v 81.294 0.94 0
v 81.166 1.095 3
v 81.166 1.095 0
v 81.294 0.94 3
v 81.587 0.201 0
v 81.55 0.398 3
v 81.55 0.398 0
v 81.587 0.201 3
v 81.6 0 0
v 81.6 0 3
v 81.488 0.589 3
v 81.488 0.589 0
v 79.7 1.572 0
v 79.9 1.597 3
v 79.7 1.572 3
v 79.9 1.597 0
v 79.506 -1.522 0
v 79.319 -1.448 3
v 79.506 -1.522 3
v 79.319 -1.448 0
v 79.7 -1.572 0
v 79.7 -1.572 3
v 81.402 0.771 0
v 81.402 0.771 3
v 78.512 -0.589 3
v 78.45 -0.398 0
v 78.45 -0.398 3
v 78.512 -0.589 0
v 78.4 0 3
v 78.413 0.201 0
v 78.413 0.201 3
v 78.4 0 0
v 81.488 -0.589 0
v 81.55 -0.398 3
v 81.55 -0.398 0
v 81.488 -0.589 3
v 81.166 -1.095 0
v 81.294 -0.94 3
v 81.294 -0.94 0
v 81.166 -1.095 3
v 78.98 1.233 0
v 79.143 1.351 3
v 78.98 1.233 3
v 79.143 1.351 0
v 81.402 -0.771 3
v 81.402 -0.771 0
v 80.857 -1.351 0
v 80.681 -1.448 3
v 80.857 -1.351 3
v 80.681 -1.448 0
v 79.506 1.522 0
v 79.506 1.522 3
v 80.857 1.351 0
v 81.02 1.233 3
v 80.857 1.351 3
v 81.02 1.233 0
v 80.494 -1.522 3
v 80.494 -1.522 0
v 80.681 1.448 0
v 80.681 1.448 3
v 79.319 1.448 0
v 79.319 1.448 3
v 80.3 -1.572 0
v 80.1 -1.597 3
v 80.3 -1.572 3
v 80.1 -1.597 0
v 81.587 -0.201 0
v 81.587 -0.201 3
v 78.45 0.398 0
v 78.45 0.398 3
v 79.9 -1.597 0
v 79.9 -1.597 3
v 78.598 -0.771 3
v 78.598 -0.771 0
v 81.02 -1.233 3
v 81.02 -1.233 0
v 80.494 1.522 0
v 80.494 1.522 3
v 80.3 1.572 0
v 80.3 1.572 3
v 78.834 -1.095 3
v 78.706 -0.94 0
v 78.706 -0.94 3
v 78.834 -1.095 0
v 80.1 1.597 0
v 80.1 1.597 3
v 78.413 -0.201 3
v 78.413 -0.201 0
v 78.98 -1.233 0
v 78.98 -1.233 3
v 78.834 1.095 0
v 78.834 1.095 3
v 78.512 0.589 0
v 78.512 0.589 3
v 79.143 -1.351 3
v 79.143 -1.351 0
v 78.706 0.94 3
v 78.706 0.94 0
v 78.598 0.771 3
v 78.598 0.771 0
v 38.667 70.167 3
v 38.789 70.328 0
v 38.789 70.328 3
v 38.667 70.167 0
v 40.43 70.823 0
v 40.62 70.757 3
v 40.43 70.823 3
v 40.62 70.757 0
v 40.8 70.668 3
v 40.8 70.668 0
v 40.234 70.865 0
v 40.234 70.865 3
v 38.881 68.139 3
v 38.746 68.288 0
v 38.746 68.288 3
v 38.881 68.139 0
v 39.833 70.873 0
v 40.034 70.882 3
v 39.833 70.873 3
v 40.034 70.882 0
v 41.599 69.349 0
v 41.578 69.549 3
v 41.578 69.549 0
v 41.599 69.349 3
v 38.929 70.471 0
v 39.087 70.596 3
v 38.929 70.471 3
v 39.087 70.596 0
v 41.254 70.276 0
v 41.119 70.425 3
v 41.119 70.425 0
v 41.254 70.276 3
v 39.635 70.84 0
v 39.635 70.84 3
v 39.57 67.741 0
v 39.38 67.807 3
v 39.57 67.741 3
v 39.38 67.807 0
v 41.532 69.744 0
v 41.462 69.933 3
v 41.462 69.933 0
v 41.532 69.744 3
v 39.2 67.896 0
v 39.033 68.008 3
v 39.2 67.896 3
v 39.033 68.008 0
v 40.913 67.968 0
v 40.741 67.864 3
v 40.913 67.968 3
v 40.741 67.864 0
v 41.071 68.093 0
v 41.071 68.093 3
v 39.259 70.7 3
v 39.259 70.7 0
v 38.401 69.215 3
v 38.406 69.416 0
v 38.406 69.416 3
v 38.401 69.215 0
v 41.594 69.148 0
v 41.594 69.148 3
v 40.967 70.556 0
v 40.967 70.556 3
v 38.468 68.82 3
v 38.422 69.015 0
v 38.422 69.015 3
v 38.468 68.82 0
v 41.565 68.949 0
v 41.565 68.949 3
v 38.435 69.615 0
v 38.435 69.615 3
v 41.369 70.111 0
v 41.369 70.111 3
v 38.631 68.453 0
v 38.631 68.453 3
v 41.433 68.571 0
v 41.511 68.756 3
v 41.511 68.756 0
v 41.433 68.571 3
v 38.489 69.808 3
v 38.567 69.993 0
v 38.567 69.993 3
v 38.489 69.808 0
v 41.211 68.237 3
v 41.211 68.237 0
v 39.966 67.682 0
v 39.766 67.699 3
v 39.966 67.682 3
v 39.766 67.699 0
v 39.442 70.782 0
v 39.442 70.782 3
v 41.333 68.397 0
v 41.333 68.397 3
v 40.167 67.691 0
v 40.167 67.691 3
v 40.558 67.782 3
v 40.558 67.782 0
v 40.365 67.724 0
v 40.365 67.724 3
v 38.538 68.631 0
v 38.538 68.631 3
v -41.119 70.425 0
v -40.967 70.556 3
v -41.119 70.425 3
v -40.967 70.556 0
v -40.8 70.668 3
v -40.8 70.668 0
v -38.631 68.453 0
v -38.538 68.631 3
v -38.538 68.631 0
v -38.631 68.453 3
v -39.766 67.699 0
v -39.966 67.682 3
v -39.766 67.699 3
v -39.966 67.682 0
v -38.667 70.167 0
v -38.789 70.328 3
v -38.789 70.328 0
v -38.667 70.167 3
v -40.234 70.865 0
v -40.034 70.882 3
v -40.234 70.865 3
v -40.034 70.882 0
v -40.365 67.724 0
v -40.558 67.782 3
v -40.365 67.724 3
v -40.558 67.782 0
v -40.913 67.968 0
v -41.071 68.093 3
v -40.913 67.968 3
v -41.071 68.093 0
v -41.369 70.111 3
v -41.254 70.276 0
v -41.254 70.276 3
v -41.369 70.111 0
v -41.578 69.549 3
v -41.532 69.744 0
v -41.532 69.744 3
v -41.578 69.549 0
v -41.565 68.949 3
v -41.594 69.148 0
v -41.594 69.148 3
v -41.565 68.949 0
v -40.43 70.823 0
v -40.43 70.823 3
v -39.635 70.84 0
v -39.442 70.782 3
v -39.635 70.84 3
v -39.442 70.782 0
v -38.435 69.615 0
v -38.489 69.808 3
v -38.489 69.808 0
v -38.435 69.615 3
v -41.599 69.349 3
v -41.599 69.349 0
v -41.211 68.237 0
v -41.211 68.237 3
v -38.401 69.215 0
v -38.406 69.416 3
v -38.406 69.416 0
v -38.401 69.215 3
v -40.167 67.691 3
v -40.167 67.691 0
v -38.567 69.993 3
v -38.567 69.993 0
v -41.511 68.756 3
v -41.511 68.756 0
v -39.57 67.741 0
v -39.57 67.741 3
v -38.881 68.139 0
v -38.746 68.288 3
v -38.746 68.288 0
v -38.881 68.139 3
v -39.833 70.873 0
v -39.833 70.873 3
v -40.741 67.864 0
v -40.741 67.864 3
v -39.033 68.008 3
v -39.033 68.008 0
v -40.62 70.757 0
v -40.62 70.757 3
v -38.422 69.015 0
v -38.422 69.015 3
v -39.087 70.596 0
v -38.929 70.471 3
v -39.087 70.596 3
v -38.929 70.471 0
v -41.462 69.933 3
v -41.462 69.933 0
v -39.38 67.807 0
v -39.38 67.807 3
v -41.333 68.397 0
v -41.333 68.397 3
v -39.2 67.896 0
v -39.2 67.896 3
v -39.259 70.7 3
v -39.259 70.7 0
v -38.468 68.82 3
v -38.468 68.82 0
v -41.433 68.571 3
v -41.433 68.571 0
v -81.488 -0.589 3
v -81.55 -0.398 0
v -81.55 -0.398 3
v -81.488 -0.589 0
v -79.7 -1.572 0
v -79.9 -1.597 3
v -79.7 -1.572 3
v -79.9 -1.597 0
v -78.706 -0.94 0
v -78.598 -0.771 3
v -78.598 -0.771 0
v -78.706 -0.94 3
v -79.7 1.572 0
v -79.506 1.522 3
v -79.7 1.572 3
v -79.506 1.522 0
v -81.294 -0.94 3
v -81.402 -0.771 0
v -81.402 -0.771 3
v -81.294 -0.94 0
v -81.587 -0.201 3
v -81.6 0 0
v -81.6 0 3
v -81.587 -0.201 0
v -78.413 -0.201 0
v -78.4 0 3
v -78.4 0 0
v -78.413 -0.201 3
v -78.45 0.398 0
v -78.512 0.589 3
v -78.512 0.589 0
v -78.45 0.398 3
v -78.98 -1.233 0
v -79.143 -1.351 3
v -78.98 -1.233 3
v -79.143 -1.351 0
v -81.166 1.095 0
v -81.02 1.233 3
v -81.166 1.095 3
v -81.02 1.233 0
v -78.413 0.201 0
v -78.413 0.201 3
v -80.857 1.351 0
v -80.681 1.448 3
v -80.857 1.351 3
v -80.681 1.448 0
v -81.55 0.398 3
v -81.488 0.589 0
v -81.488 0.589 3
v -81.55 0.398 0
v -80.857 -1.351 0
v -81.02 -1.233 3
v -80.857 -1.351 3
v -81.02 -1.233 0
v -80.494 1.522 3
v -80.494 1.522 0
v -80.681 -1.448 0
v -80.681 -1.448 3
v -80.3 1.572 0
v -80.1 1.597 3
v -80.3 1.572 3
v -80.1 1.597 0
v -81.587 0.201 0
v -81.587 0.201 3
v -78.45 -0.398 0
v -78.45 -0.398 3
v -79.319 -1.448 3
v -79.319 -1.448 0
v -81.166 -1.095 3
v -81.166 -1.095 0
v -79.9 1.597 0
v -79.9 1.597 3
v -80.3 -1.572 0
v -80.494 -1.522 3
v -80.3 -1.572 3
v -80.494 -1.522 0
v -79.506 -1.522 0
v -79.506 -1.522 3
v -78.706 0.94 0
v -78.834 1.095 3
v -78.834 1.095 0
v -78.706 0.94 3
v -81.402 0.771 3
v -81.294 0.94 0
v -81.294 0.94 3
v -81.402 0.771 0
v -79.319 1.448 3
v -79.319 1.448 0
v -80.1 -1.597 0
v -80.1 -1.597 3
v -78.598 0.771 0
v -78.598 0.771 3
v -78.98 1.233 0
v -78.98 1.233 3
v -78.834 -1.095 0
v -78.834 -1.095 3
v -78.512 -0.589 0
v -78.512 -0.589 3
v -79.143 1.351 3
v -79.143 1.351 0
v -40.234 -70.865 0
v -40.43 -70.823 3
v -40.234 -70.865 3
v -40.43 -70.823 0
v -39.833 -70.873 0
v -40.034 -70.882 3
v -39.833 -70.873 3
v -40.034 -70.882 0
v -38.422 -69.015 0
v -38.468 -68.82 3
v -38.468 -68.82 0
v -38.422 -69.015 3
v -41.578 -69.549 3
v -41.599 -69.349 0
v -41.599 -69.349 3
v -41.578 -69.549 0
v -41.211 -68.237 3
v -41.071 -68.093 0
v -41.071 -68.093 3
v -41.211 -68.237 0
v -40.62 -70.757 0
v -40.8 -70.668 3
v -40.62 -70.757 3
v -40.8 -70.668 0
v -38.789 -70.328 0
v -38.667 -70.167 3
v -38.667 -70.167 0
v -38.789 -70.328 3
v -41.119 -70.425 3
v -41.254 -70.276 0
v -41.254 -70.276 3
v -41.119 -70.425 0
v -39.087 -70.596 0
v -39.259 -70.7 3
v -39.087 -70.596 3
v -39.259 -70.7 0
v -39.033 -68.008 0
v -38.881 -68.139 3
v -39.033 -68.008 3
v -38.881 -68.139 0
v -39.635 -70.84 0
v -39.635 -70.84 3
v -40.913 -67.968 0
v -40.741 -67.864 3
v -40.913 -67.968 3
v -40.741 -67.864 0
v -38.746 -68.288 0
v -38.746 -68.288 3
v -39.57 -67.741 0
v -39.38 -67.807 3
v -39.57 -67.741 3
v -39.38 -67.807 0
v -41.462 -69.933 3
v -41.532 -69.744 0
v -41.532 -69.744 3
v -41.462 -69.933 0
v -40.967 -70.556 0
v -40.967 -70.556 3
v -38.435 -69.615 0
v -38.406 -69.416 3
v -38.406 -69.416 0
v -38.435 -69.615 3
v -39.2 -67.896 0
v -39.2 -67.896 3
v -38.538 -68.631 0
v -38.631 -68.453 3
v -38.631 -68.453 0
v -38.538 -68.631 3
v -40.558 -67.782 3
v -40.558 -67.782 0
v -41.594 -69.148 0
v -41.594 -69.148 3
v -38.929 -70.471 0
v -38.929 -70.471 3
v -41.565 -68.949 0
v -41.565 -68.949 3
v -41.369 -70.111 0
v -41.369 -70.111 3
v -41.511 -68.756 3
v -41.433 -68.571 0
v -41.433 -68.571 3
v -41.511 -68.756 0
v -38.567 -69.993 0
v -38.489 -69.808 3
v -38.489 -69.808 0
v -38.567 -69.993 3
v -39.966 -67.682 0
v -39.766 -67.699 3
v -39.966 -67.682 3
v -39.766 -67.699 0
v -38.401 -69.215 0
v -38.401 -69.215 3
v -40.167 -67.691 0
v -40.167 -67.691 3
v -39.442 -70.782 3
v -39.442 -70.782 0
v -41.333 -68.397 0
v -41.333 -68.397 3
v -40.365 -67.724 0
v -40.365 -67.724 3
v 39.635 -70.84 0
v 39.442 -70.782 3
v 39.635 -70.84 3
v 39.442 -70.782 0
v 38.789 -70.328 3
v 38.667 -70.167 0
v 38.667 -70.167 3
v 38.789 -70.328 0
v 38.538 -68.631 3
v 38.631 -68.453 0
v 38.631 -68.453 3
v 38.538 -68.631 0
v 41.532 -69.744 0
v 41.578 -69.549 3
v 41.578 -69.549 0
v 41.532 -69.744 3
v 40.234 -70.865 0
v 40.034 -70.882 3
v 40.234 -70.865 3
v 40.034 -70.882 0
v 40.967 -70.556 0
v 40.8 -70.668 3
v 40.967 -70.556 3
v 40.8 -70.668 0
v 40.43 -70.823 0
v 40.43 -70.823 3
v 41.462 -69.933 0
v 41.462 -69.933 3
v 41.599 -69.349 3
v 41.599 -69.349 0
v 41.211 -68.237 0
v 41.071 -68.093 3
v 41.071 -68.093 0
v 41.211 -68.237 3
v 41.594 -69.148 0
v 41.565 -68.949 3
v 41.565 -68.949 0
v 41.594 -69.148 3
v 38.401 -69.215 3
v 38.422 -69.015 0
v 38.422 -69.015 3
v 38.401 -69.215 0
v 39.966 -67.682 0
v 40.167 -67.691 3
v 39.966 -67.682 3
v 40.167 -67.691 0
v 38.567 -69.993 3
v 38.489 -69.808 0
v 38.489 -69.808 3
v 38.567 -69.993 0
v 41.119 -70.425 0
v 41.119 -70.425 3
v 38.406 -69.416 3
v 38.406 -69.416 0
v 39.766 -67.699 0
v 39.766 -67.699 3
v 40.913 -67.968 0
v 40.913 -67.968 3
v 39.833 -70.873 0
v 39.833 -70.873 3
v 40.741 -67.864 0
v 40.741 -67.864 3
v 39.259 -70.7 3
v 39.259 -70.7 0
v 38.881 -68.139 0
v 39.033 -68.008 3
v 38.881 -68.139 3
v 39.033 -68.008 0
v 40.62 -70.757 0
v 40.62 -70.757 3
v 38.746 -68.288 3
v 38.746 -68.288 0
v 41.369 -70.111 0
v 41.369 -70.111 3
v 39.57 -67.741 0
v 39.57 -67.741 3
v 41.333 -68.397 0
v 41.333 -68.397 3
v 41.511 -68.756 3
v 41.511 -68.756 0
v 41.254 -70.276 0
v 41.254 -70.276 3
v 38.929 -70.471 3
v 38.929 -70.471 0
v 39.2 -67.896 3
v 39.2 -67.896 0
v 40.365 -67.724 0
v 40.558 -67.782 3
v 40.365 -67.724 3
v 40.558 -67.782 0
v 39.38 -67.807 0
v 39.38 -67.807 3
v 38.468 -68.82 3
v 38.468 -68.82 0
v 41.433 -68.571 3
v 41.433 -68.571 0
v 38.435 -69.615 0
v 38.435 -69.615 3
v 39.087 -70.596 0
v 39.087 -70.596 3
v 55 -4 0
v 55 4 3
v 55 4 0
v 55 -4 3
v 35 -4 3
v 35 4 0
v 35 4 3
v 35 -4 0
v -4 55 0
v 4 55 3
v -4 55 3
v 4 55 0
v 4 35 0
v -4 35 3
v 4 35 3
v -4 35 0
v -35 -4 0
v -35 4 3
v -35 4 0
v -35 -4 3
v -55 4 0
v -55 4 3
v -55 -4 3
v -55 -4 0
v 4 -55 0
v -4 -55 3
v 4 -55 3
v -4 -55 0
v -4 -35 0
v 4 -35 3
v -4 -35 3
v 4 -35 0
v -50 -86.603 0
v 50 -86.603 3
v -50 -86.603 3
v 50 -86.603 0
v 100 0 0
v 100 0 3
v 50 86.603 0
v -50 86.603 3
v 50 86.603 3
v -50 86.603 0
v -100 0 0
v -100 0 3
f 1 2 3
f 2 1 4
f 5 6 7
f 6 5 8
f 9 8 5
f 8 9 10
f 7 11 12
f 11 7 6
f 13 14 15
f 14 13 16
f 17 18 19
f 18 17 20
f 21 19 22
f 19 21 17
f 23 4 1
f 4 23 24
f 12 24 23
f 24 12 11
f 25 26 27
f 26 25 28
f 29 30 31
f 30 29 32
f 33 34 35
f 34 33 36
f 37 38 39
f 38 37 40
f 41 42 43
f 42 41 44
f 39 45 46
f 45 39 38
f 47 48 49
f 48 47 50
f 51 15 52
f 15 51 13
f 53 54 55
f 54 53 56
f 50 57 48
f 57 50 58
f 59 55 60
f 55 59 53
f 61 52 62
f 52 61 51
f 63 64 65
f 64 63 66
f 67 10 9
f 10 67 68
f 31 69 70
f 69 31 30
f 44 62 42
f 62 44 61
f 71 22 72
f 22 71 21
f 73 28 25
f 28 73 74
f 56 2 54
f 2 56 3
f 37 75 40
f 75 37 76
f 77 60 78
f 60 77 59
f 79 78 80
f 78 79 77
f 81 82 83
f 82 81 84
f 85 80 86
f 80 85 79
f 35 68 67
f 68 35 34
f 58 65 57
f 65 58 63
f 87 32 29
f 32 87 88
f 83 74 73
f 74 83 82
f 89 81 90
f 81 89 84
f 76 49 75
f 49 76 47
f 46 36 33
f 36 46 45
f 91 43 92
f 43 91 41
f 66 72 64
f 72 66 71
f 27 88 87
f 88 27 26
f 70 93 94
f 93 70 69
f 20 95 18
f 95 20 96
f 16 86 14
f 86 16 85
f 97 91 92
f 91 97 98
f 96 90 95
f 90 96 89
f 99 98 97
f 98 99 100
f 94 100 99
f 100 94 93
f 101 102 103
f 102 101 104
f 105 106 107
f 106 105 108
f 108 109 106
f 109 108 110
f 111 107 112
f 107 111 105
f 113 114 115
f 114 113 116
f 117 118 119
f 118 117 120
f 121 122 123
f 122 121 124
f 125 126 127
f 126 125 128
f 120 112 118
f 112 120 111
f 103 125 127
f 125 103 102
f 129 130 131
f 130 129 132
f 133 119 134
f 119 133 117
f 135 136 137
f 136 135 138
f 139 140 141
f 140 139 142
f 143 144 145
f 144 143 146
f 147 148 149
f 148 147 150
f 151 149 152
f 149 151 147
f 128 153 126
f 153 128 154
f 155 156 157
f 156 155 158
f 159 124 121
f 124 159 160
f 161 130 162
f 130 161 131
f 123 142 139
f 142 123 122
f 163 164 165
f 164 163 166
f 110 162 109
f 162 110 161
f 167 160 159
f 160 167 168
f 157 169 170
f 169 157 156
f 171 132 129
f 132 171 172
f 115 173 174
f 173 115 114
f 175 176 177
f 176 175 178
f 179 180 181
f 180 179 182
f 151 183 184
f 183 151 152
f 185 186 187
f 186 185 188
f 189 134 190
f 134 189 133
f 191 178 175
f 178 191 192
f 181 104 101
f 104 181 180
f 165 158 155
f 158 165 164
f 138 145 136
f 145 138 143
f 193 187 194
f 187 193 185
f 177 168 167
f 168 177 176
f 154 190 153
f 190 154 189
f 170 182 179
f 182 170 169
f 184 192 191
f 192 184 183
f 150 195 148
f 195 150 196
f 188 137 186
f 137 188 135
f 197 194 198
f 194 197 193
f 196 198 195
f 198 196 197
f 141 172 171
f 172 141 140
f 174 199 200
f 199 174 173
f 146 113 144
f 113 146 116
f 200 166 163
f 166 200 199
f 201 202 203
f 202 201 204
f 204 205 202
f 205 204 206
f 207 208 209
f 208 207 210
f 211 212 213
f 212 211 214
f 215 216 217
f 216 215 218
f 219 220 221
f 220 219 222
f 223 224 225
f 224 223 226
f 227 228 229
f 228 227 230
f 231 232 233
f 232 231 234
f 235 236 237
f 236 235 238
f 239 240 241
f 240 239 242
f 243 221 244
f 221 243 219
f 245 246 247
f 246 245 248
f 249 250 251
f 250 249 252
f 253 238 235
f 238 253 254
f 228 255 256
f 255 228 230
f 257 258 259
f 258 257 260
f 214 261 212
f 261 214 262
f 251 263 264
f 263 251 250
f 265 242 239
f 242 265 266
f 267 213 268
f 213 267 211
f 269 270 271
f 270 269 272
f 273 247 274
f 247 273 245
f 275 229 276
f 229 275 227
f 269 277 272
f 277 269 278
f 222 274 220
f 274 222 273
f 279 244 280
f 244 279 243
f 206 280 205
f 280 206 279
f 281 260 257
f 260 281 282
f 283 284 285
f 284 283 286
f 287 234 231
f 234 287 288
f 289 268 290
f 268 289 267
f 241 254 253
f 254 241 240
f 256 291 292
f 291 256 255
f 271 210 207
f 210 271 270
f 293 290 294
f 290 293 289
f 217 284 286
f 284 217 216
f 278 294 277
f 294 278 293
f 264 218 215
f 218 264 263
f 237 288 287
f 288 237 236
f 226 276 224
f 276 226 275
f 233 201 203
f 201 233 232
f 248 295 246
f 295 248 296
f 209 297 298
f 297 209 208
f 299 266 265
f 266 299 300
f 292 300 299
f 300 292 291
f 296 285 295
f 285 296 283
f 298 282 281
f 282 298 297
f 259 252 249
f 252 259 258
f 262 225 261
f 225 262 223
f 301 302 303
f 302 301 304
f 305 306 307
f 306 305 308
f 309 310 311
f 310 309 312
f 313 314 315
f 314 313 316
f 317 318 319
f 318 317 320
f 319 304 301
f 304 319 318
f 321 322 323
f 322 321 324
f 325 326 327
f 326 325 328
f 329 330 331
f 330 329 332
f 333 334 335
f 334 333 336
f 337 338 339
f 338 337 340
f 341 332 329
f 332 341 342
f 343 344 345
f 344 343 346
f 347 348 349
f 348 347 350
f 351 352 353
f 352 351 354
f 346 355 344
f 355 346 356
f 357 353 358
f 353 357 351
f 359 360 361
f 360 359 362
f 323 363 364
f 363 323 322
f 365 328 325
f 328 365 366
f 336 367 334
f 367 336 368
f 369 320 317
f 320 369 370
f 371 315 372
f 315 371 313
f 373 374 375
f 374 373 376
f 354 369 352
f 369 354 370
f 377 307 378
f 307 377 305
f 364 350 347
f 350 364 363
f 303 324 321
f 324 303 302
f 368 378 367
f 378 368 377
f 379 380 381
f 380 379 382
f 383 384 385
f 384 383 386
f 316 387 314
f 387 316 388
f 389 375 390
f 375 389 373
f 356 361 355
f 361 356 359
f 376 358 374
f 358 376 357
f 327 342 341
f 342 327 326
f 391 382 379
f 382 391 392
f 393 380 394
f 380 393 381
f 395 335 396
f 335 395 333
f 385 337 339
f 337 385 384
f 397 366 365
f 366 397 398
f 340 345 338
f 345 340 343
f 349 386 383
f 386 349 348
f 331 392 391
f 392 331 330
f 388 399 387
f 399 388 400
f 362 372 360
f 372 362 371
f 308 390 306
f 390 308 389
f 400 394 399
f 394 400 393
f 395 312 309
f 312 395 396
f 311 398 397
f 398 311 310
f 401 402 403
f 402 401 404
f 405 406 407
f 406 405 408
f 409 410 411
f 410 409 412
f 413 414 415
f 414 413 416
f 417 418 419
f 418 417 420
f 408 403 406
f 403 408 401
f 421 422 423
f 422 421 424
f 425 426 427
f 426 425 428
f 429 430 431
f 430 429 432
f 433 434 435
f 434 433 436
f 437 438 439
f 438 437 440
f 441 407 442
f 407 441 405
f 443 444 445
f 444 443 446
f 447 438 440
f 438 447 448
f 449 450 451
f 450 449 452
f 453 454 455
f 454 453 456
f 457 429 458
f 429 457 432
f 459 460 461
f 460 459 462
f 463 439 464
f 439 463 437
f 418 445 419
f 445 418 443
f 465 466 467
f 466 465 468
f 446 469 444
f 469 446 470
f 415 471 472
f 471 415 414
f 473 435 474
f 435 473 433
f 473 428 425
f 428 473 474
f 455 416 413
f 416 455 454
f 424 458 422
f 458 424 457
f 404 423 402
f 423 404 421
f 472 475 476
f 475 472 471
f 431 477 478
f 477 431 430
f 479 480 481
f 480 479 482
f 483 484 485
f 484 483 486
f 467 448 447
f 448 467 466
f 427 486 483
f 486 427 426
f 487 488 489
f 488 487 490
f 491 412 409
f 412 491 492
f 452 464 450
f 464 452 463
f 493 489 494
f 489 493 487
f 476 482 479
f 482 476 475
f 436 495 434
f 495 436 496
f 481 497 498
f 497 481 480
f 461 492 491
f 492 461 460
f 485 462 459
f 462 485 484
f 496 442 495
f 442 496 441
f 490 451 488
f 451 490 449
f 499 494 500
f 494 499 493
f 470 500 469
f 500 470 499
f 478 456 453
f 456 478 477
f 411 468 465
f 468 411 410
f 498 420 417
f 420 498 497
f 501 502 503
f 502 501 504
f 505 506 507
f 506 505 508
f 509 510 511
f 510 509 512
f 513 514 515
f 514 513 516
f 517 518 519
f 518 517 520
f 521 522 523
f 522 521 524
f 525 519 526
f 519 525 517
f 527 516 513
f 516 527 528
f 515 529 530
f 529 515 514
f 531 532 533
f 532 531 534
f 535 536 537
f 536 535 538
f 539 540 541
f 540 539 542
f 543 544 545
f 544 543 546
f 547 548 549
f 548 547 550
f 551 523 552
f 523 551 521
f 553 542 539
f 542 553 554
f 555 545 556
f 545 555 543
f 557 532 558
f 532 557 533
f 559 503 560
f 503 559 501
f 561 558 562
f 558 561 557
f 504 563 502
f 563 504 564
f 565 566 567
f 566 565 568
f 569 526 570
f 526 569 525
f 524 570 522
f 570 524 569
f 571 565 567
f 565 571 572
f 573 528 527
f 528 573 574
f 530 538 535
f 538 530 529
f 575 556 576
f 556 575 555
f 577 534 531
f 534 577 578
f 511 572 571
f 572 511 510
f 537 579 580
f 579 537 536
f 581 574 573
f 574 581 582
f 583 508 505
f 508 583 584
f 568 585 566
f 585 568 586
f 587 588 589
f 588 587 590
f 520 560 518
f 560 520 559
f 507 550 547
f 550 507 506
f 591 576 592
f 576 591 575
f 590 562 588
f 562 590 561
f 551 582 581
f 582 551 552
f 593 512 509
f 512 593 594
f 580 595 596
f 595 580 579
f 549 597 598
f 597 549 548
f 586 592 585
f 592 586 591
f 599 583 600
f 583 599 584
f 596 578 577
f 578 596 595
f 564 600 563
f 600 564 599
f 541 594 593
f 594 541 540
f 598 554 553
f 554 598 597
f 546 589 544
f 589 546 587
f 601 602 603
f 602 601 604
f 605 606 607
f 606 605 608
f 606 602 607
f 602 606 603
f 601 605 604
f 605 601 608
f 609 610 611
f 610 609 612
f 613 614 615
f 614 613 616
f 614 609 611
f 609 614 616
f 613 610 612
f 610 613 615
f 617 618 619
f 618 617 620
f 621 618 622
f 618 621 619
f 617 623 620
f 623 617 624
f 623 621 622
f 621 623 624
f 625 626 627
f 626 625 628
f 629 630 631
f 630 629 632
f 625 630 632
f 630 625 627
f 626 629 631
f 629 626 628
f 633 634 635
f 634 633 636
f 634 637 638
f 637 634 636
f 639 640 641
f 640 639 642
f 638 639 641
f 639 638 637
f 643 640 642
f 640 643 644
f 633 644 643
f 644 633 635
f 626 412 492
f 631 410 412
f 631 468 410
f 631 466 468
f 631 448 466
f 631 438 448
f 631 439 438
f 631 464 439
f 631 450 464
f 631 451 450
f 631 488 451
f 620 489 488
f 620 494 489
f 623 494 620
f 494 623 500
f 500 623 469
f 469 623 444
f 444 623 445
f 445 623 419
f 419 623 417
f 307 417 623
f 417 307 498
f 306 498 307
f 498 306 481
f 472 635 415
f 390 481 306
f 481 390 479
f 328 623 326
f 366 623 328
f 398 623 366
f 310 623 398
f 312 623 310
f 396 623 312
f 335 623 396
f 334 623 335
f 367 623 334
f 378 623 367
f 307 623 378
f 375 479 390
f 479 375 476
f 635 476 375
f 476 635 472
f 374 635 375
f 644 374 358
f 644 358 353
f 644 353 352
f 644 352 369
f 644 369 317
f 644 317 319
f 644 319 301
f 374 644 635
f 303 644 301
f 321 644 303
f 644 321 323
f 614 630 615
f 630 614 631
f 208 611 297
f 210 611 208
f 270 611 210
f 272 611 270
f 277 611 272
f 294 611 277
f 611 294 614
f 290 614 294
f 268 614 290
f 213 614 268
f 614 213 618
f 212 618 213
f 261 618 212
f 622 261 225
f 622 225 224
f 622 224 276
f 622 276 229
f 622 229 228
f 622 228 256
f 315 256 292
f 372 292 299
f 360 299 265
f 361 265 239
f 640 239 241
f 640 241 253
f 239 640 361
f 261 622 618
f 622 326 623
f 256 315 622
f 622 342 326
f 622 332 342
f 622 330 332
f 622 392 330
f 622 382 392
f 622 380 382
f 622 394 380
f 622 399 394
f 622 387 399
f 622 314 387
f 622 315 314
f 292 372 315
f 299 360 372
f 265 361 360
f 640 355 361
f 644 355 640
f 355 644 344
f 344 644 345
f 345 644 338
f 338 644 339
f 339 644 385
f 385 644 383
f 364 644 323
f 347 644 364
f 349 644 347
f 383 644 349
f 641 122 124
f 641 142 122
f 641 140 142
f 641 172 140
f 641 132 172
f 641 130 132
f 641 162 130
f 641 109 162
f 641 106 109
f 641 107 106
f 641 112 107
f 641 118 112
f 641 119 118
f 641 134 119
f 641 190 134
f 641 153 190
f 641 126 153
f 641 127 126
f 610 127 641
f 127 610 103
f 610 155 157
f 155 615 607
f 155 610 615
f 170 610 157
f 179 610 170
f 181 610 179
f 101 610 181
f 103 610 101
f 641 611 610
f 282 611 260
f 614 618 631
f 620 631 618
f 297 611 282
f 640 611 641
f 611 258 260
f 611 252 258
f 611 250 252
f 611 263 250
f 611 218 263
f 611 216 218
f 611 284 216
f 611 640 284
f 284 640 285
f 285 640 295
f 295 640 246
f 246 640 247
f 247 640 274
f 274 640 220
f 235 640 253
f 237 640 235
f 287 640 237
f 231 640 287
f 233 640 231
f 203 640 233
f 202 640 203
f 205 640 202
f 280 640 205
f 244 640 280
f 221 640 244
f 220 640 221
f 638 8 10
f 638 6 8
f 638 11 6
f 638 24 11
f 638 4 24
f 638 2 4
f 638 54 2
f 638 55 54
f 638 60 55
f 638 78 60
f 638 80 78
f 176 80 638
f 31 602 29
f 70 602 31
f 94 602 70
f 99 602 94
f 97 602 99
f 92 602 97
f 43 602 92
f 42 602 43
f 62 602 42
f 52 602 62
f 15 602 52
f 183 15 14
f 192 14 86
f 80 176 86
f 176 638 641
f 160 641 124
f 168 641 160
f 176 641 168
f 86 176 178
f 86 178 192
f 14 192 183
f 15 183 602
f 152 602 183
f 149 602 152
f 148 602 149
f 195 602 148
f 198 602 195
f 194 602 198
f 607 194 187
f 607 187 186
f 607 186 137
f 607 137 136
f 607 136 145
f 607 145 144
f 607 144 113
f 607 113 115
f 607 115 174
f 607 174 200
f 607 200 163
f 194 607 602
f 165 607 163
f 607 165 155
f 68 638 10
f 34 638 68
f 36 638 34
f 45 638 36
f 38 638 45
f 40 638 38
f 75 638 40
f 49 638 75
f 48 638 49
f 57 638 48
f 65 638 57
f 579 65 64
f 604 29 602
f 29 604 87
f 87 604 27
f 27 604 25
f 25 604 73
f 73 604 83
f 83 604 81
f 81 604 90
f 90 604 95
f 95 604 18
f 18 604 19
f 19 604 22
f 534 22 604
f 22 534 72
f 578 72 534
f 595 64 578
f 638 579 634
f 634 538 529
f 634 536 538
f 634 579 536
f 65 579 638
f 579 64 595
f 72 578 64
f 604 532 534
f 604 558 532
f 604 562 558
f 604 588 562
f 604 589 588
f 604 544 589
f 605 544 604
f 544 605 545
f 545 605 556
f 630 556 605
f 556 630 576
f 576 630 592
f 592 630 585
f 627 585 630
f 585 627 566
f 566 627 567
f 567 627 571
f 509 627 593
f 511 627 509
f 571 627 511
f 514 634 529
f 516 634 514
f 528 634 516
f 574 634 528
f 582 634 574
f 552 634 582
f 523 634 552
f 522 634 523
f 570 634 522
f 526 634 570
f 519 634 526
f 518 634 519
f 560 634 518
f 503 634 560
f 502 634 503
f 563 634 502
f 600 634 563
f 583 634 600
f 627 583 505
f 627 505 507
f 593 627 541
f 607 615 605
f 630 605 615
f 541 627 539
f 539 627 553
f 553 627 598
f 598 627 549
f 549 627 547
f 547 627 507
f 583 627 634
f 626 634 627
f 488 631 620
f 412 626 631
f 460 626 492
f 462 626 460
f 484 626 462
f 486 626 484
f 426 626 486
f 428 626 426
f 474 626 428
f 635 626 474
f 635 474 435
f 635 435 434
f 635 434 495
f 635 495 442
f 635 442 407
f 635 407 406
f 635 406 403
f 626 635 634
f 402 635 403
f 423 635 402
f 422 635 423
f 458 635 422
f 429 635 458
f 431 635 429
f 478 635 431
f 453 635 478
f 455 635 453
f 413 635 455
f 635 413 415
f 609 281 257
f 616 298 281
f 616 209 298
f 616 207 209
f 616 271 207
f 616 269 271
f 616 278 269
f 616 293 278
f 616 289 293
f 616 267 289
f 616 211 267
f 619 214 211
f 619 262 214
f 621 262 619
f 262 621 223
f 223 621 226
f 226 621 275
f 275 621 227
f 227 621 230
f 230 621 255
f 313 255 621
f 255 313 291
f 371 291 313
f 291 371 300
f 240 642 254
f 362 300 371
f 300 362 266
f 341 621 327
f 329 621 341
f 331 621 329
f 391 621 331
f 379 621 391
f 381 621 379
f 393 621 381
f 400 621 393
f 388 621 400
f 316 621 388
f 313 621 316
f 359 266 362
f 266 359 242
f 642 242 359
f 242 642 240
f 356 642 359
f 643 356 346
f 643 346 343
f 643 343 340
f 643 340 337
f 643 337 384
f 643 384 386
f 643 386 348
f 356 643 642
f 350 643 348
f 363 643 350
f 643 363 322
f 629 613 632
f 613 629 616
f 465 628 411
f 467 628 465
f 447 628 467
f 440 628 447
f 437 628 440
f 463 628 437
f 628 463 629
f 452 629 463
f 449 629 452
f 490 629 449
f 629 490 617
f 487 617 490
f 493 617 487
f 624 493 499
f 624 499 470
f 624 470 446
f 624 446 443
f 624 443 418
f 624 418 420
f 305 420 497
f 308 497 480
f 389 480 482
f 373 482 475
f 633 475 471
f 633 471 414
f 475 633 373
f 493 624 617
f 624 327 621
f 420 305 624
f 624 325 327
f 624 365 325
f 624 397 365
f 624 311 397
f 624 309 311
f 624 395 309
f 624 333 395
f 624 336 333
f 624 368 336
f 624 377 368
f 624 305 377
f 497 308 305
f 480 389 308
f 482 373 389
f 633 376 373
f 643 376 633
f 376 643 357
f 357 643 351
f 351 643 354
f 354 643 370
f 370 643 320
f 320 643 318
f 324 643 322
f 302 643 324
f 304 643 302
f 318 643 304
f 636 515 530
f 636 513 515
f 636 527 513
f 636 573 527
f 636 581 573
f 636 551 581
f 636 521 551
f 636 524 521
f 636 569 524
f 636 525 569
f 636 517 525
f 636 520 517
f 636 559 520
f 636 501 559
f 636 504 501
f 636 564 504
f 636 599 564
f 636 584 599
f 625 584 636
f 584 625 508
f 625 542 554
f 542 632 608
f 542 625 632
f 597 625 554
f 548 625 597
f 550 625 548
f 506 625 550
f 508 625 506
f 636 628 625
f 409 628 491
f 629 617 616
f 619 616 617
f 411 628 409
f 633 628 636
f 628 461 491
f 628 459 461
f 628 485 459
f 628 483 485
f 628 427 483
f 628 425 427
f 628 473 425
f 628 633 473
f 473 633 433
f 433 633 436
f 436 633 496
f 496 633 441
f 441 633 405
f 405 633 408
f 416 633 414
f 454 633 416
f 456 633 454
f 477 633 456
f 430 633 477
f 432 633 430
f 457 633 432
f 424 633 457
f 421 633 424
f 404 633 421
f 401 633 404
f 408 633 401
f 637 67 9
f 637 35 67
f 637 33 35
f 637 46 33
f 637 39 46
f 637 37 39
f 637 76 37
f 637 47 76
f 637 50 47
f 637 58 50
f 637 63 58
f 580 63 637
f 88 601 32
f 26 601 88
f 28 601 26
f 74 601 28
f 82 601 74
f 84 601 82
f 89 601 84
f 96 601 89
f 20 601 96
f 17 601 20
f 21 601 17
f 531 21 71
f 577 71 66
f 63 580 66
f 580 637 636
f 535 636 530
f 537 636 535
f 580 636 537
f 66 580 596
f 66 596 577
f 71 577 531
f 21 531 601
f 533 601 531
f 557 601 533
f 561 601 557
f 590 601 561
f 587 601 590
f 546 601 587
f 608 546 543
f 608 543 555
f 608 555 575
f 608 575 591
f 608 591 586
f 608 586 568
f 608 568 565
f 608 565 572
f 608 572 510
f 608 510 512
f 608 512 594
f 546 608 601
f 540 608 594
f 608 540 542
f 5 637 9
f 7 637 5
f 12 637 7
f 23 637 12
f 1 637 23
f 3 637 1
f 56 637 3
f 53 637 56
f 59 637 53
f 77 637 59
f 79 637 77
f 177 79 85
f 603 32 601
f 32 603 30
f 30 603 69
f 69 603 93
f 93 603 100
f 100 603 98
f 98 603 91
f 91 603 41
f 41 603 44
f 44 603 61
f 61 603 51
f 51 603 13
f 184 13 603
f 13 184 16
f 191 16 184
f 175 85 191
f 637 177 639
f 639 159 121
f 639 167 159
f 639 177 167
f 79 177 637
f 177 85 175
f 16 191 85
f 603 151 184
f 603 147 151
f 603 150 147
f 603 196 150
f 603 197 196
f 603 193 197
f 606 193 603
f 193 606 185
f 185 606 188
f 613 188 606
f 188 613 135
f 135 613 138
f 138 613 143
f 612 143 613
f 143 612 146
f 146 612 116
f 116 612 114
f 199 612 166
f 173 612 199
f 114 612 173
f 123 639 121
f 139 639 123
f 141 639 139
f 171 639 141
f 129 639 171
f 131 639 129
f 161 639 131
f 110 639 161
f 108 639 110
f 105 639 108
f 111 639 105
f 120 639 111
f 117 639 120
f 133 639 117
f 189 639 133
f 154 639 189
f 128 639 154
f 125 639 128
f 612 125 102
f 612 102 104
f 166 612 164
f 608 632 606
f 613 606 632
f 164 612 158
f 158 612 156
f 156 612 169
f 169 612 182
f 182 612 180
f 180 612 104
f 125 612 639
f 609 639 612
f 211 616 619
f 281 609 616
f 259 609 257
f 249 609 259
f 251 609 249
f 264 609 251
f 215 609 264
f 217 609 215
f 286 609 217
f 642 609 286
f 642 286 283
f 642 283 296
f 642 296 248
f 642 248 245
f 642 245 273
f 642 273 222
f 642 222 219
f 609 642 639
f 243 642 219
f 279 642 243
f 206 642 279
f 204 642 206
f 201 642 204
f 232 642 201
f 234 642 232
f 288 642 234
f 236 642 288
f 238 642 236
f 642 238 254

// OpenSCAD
// file: parameters.scad
arm_n = 6;
rotor_diameter = 250;
drone_diameter = (rotor_diameter/sin(180/arm_n));

global_clearence = 0.1;


// M3 parameters =========================================
M3_screw_diameter = 3.2;
M3_nut_height = 2.7;
M3_nut_diameter = 6.6;
M3_nut_pocket = 5.6;


// Battery size ==========================================
Battery_length = 195;
Battery_height = 91;
Battery_width = 64;


// 3D printer para. ======================================
print_plate_x = 200;
print_plate_y = 220;


// motor parameters ======================================
motor_diameter = 40;
motor_height = 18;
motor_n_screws = 4;
motor_screws_diameter = 20;


// motor holder para. (666_1001) =========================
motor_plate_height = 7;
motor_plate_diameter = motor_diameter;
motor_plate_hole_diameter = 10;
motor_tube_x_offset = motor_diameter/2 - 5;
motor_tube_z_offset = 20;

screws_n = 2;
screws_gap = 15;
screws_offset_x = 7.5;
screws_offset_y = 5;
holding_part_x = 30;
upper_holding_part_height = 15;
washer_size_x = 10;


// avionics plate para. (666_1003) =======================
avionics_plate_diameter = 200;
avionics_plate_height = 3;
avionics_plate_z_offset = 25;

av_screws_diameter = 160;
av_cable_holes_offset = 70;
av_cable_holes_width = 8;
av_cable_holes_length = 20;


// mid poly base para. (666_1004) ========================
mid_poly_diameter = 120;
mid_poly_low_diameter = mid_poly_diameter*cos(180/arm_n);
mid_poly_side = mid_poly_low_diameter*tan(180/arm_n);


// arm pipe para. (888_1002) =============================
arm_pipe_diameter = 20;
arm_pipe_inner_diameter = 18;
arm_pipe_x_offset = mid_poly_low_diameter/2-.1;
arm_pipe_z_offset = 5;
arm_pipe_length = drone_diameter-motor_tube_x_offset-arm_pipe_x_offset;


// main base para. (666_1004) ============================
base_diameter = 300;
base_height = 40;
base_bottom_height = base_height/2;
base_arm_screw_x_offset = 5;

base_low_diameter = base_diameter*cos(180/arm_n);
base_side = base_low_diameter*tan(180/arm_n);
base_arm_washer_width = 10;
base_middle_hole_diameter = 70;
base_middle_screws_diameter = base_middle_hole_diameter+10;

screws_x_offset_inside = 5;
screws_x_offset_outside = 15;
screws_y_offset = 2.5;
screws_z_offset = (base_bottom_height-arm_pipe_diameter/2)/2;

cutting_edge_width = 10;
screws_joining_sides_diameter = base_diameter-50;


// mid poly if base cant fit =============================
base_can_fit = base_diameter <= min(print_plate_x,print_plate_y) ? true : false;
// main file
include <parameters.scad>;

module 666_1003(draft) {
    difference(){
        cylinder(avionics_plate_height, d=avionics_plate_diameter, $fn = arm_n);
        
        // screws to base
        for (i = [0:360/arm_n:360-(360/arm_n)]) {
            rotate([0,0,i])
            translate([av_screws_diameter/2,0,-1])
            cylinder(avionics_plate_height+2,d=M3_screw_diameter, $fn = draft ? 10 : 50);
        }
        
        // holes for cables
        for (i = [0:90:360]) {
            rotate([0,0,i])
            translate([av_cable_holes_offset/2,-av_cable_holes_width/2,-1])
            cube([av_cable_holes_length,av_cable_holes_width,avionics_plate_height+2]);
        }
    }
}

666_1003();
